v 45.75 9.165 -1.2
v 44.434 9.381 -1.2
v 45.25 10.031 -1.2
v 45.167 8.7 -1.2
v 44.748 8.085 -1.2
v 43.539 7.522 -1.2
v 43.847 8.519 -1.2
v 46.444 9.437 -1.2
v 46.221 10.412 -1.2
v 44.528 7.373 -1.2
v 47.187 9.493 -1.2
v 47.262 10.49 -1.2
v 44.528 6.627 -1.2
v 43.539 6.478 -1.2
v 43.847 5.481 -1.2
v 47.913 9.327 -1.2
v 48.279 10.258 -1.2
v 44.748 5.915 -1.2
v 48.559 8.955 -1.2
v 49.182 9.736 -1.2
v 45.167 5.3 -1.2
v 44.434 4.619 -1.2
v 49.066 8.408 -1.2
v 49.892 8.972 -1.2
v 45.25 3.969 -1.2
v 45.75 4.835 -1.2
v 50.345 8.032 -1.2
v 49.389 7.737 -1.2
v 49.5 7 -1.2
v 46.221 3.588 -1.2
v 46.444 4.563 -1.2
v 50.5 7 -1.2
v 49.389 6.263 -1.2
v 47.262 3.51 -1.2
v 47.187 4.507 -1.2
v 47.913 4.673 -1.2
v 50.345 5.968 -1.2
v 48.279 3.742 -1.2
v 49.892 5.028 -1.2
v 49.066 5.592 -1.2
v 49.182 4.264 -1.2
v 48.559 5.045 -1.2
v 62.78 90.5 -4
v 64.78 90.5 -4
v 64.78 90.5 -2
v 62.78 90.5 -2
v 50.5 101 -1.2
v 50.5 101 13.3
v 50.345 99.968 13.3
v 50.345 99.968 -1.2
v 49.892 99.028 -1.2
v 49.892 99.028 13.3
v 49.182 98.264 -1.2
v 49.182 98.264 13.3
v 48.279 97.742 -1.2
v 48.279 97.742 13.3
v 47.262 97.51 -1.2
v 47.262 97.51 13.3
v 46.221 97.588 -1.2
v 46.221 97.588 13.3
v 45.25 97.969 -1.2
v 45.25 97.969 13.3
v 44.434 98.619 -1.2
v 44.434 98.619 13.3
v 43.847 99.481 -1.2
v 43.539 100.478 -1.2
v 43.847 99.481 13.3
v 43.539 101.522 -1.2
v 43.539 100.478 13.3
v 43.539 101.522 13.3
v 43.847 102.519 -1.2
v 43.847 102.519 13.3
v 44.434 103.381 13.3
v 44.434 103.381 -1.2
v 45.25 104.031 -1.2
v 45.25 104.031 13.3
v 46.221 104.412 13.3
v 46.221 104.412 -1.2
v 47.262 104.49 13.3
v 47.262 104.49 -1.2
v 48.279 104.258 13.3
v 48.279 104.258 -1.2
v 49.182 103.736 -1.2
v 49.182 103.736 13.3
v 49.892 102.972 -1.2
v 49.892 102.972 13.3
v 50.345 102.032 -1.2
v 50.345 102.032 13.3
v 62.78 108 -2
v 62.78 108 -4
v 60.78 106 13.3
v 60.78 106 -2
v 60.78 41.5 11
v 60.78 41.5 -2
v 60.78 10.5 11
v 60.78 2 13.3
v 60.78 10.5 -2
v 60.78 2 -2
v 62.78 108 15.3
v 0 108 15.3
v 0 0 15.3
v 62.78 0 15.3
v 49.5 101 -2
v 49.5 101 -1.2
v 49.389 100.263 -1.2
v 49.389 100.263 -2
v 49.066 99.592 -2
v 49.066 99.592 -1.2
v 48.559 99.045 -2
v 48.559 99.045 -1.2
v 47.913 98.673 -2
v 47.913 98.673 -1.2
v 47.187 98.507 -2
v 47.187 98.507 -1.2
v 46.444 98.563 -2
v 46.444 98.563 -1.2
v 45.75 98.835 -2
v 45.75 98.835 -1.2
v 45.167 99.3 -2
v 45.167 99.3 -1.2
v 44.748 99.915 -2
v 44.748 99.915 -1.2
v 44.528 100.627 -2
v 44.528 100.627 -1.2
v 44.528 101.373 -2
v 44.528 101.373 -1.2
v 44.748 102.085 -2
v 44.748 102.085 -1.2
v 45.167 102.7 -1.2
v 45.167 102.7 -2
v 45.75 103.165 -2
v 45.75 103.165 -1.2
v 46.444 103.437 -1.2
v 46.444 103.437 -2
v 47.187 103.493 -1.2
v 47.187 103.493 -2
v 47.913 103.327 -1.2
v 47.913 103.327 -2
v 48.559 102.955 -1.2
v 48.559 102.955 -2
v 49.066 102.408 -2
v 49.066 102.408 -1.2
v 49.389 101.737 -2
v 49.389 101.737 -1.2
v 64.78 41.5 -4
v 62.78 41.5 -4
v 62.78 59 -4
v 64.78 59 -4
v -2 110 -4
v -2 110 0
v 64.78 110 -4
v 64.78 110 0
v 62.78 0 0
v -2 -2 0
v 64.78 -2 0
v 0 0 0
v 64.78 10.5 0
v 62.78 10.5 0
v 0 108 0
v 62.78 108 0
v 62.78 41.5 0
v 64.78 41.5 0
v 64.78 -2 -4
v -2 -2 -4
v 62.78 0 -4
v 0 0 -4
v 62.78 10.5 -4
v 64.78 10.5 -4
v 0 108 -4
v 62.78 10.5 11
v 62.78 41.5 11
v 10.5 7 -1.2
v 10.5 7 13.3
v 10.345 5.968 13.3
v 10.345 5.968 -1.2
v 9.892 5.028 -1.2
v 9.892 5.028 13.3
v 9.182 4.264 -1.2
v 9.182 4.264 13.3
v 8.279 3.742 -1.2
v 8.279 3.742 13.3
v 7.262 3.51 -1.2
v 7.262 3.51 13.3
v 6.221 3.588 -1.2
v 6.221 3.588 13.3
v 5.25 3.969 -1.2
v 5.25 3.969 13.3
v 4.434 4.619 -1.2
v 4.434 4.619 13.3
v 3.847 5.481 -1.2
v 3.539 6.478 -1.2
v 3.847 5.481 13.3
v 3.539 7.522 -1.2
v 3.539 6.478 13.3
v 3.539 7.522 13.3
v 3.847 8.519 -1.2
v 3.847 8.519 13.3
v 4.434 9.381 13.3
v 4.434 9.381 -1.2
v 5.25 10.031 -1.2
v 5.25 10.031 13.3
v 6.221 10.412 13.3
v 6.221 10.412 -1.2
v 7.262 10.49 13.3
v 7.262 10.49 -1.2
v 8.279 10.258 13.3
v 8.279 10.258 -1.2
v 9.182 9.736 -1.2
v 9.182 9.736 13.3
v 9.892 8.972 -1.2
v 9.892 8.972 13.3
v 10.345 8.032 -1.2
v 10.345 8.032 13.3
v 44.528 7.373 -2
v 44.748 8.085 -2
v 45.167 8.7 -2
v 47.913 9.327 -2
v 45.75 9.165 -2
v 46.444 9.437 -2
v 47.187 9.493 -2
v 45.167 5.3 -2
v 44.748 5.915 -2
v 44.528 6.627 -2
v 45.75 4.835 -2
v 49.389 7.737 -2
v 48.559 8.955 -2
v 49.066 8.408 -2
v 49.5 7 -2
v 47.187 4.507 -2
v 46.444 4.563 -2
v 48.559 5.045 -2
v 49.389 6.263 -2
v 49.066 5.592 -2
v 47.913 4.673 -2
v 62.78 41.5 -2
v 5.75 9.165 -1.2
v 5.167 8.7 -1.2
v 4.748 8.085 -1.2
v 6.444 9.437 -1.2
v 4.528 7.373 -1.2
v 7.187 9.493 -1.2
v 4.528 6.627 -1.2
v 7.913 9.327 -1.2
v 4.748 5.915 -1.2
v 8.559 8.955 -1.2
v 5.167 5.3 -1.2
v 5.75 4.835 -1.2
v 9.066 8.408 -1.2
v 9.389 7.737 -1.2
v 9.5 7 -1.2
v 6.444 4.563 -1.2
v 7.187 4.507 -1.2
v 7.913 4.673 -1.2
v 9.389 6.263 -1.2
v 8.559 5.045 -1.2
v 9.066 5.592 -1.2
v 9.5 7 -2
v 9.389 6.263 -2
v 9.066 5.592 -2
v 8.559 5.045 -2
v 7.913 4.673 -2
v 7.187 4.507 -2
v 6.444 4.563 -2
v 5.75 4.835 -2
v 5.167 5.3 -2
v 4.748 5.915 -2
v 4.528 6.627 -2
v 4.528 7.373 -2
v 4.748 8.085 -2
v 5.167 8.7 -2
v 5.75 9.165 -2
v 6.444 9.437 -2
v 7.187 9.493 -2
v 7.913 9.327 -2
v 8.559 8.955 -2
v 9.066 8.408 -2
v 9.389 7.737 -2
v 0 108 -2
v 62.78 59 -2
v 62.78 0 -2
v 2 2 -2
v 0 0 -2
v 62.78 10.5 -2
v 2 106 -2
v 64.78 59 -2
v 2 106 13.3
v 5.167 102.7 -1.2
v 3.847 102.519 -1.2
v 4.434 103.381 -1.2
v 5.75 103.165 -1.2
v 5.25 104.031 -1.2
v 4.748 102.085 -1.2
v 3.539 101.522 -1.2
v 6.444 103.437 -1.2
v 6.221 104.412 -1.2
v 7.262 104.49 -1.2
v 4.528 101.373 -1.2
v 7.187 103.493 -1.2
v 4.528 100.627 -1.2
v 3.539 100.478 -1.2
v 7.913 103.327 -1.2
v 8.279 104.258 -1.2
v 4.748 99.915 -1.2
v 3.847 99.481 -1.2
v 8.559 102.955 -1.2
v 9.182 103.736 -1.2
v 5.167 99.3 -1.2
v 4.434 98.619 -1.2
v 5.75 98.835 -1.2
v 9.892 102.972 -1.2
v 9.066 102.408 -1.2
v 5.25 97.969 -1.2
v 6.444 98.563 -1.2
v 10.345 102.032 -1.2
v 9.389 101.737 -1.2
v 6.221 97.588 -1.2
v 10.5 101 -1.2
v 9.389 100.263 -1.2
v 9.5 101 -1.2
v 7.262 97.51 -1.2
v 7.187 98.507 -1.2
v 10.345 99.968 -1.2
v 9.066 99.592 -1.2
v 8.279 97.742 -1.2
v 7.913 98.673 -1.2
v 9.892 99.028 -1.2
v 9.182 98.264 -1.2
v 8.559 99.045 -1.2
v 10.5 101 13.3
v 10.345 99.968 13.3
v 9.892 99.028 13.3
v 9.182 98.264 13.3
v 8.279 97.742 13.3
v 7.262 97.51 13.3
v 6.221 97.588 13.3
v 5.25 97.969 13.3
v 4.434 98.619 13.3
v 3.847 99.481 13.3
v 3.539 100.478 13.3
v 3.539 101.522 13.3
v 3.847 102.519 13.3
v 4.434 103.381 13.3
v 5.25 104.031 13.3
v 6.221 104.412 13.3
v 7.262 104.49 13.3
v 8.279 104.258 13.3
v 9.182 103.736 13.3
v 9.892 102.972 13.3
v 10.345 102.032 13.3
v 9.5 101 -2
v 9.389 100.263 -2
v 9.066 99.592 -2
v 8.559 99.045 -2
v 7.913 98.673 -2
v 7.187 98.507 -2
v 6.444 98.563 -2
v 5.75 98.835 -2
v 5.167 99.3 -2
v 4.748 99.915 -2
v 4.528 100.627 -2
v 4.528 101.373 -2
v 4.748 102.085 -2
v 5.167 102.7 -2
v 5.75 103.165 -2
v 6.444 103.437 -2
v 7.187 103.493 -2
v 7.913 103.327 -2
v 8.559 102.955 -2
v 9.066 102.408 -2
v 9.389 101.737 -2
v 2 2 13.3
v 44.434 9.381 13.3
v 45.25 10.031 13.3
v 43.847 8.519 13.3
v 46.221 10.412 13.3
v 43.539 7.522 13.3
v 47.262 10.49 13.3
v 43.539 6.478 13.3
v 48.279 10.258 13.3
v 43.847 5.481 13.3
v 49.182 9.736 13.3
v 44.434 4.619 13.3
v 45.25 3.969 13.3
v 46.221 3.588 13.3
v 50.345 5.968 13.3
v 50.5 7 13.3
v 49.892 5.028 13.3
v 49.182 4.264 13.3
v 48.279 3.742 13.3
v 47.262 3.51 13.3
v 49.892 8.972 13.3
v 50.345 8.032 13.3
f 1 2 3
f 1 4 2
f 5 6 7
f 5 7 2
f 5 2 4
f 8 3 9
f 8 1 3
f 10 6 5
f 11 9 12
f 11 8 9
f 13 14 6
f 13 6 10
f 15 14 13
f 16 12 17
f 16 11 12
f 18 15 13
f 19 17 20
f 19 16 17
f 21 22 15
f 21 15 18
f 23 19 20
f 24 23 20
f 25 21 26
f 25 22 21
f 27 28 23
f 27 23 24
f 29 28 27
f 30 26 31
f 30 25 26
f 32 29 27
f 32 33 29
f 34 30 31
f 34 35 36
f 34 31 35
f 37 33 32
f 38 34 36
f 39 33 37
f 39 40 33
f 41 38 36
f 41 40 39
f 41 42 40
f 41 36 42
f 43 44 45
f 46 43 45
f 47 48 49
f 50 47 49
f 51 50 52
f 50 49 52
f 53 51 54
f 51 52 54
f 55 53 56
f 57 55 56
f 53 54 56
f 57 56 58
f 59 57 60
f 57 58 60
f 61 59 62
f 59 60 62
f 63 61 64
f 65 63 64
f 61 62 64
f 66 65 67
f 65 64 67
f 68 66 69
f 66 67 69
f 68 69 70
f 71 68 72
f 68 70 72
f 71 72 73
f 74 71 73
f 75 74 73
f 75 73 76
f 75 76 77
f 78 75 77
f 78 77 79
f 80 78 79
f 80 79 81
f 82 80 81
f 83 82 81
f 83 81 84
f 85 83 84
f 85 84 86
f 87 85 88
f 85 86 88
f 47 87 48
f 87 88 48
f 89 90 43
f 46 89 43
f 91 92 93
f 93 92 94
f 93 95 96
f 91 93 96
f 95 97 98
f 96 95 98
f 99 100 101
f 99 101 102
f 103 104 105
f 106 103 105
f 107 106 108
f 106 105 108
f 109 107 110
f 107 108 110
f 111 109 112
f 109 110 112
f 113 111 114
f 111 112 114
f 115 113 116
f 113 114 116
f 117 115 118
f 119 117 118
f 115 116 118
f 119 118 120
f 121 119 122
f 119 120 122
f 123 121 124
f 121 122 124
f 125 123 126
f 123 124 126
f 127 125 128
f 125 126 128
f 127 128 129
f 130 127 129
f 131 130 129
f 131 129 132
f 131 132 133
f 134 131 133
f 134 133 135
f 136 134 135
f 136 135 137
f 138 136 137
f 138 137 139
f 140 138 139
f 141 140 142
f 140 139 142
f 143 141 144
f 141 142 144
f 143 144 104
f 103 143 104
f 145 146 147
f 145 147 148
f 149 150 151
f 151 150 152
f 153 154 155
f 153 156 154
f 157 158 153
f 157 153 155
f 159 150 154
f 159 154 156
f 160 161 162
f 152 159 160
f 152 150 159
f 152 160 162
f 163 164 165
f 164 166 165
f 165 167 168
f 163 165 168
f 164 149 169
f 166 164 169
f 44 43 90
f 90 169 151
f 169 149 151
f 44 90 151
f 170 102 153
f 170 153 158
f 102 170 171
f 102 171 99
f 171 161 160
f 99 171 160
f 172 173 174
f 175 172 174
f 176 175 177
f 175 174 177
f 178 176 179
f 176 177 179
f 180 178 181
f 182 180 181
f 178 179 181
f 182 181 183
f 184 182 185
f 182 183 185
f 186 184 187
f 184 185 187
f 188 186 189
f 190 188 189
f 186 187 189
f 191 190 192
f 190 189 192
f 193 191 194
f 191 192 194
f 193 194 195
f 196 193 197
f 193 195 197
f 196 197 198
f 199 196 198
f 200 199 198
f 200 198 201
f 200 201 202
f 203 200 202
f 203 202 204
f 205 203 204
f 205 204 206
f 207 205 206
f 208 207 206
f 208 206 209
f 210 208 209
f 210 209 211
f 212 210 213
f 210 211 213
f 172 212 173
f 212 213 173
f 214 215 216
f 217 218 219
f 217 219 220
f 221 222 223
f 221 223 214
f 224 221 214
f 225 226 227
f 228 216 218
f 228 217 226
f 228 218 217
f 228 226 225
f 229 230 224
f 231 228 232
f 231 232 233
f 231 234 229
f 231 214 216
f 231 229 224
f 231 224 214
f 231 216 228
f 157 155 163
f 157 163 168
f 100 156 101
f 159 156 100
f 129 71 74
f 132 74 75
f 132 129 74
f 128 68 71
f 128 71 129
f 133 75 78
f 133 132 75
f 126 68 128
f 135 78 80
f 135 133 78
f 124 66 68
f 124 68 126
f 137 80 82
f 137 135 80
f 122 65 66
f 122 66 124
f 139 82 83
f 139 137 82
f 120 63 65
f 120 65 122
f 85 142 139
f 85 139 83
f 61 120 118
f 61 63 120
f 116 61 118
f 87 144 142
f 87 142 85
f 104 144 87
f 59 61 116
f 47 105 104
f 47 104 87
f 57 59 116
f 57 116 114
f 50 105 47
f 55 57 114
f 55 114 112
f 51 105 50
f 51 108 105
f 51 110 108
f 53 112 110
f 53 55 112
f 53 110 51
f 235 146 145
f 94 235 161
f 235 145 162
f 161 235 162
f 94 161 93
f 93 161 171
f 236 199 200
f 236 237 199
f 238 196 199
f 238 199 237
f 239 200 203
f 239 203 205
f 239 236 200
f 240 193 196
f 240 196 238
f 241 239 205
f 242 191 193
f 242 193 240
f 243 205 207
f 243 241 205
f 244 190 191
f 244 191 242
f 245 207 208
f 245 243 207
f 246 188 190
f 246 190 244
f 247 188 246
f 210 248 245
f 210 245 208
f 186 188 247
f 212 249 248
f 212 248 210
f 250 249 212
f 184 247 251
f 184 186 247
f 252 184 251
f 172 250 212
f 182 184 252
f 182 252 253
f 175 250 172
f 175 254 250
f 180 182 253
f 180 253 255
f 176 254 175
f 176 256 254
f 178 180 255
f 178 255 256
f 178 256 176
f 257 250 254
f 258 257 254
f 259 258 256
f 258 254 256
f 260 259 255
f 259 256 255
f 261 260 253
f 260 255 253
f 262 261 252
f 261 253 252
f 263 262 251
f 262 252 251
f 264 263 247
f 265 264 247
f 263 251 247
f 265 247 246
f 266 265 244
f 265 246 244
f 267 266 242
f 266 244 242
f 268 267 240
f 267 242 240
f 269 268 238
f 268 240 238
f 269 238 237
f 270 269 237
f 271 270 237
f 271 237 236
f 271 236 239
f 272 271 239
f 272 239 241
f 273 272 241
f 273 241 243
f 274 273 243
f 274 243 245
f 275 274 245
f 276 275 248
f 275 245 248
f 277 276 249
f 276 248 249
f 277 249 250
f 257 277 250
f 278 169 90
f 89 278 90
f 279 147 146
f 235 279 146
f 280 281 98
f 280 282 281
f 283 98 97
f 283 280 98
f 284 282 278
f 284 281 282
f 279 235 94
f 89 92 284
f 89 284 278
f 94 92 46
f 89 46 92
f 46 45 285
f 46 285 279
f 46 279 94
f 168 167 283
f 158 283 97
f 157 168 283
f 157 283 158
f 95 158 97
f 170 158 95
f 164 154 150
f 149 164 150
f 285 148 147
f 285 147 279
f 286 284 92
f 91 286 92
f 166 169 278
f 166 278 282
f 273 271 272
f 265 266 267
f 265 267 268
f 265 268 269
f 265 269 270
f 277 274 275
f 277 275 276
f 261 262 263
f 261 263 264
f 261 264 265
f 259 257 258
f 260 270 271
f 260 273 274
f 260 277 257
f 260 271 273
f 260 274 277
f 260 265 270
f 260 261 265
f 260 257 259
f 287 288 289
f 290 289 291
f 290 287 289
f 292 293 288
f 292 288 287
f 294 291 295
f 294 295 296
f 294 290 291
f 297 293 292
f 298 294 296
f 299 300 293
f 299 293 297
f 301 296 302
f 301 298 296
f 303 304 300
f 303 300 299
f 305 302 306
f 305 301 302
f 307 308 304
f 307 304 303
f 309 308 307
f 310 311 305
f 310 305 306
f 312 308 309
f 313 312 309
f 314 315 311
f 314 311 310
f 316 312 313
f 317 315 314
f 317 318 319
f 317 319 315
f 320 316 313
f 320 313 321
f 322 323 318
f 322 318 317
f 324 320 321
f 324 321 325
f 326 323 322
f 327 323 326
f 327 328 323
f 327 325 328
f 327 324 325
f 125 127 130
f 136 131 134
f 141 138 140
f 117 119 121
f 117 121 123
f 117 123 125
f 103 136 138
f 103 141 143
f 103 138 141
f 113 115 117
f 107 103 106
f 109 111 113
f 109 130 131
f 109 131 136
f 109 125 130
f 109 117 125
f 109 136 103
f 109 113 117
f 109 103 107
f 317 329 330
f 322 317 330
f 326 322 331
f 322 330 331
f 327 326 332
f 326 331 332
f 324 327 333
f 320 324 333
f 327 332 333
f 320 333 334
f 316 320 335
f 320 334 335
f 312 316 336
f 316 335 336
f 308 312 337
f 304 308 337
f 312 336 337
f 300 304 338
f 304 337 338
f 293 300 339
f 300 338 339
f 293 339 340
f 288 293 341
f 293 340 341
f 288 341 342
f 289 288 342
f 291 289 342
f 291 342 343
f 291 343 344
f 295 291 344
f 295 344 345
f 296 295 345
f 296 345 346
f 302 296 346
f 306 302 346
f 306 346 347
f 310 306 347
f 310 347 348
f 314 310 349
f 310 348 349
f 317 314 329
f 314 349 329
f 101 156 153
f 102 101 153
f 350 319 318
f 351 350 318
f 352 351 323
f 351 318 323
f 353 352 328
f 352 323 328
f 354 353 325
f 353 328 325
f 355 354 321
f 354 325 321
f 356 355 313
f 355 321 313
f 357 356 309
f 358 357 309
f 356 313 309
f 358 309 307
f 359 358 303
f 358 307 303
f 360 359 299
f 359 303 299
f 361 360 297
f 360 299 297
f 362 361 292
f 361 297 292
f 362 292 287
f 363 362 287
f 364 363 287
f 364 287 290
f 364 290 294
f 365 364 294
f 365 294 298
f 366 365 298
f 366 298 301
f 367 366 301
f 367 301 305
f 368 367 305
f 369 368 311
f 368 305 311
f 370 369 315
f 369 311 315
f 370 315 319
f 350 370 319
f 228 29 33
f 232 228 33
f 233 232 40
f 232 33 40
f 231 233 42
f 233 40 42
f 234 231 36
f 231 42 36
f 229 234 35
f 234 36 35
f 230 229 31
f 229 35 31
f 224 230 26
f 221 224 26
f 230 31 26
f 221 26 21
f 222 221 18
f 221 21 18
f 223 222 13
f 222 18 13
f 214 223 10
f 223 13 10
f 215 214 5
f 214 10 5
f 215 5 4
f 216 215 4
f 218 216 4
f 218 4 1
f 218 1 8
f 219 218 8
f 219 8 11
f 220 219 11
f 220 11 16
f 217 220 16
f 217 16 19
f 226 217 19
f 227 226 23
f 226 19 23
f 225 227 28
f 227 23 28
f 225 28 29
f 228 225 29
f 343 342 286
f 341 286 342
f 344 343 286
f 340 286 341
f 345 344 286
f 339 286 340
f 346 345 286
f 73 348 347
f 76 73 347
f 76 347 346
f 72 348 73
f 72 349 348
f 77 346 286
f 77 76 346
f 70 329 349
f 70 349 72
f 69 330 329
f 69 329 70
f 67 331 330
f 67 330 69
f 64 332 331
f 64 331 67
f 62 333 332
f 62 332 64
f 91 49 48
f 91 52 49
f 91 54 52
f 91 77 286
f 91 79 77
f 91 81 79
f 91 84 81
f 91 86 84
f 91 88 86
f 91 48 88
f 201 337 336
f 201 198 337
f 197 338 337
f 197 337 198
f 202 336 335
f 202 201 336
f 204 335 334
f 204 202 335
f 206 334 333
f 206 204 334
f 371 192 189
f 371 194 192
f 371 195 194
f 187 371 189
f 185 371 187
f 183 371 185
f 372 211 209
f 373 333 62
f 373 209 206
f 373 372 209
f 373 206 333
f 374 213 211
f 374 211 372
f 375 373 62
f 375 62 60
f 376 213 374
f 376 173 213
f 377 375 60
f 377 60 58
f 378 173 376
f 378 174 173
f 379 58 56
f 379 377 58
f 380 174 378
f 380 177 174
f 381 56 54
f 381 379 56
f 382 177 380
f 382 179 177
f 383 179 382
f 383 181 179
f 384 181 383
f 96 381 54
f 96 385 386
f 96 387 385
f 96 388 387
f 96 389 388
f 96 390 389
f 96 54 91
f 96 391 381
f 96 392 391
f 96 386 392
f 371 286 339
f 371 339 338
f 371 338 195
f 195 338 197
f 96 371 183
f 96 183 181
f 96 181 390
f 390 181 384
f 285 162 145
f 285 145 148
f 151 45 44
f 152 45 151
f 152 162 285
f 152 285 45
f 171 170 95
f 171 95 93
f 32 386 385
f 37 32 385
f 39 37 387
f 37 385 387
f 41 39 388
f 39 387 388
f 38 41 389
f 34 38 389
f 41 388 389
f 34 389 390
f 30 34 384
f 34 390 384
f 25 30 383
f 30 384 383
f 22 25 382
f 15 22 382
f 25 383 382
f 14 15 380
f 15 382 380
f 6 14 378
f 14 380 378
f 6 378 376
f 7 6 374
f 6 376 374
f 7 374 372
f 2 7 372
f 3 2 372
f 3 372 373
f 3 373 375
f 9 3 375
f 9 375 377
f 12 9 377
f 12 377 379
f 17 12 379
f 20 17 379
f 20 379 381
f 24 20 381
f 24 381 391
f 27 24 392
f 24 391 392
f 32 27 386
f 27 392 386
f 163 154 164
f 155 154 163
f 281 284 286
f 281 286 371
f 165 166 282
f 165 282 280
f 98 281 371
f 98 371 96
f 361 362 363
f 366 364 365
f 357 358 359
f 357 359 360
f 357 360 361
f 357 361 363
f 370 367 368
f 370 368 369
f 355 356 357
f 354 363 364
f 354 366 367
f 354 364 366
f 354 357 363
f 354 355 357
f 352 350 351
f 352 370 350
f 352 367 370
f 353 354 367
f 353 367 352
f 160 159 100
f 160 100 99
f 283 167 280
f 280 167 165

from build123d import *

# Parameters (mm, degrees)
SKETCH004_W     = 66.78
SKETCH004_H     = 112
PAD002_DEPTH    = 4
SKETCH005_W     = 62.78
SKETCH005_H     = 108
PAD003_DEPTH    = 15.3
SKETCH006_W     = 62.78
SKETCH006_H     = 108
POCKET002_DEPTH = 2
SKETCH007_W     = 58.78
SKETCH007_H     = 104
POCKET003_DEPTH = 15.3
SKETCH008_R     = 3.5
PAD004_DEPTH    = 14.5
SKETCH009_R     = 2.5
PAD005_DEPTH    = 0.8
SKETCH010_W     = 31.5
SKETCH010_H     = 5.15
POCKET004_DEPTH = 5
SKETCH011_W     = 31
SKETCH011_H     = 15
POCKET005_DEPTH = 5


with BuildPart() as part:
    # Sketch004 → Pad002 (new body)
    with BuildSketch(Plane.XY):
        with Locations((31.39, 54)):
            Rectangle(SKETCH004_W, SKETCH004_H)
    extrude(amount=-PAD002_DEPTH)

    # Sketch005 (on Face5 of Pad002) → Pad003 (join)
    with BuildSketch(Plane.XY):
        with Locations((31.39, 54)):
            Rectangle(SKETCH005_W, SKETCH005_H)
    extrude(amount=PAD003_DEPTH)

    # Sketch006 (on Face5 of Pad003) → Pocket002 (cut)
    with BuildSketch(Plane(origin=(0, 0, -4), x_dir=(1, 0, 0), z_dir=(0, 0, -1))):
        with Locations((31.39, -54)):
            Rectangle(SKETCH006_W, SKETCH006_H)
    extrude(amount=-POCKET002_DEPTH, mode=Mode.SUBTRACT)

    # Sketch007 (on Face16 of Pocket002) → Pocket003 (cut)
    with BuildSketch(Plane(origin=(0, 0, -2), x_dir=(1, 0, 0), z_dir=(0, 0, -1))):
        with Locations((31.39, -54)):
            Rectangle(SKETCH007_W, SKETCH007_H)
    extrude(amount=-POCKET003_DEPTH, mode=Mode.SUBTRACT)

    # Sketch008 (on Face21 of Pocket003) → Pad004 (join)
    with BuildSketch(Plane(origin=(0, 0, 13.3), x_dir=(1, 0, 0), z_dir=(0, 0, -1))):
        with Locations((7, -7)):
            Circle(SKETCH008_R)
        with Locations((47, -7)):
            Circle(SKETCH008_R)
        with Locations((7, -101)):
            Circle(SKETCH008_R)
        with Locations((47, -101)):
            Circle(SKETCH008_R)
    extrude(amount=PAD004_DEPTH)

    # Sketch009 (on Face28 of Pad004) → Pad005 (join)
    with BuildSketch(Plane(origin=(0, 0, -1.2), x_dir=(1, 0, 0), z_dir=(0, 0, -1))):
        with Locations((7, -7)):
            Circle(SKETCH009_R)
        with Locations((47, -7)):
            Circle(SKETCH009_R)
        with Locations((7, -101)):
            Circle(SKETCH009_R)
        with Locations((47, -101)):
            Circle(SKETCH009_R)
    extrude(amount=PAD005_DEPTH)

    # Sketch010 (on Face3 of Pad005) → Pocket004 (cut)
    with BuildSketch(Plane.YZ.offset(64.78)):
        with Locations((74.75, -4.575)):
            Rectangle(SKETCH010_W, SKETCH010_H)
    extrude(amount=-POCKET004_DEPTH, mode=Mode.SUBTRACT)

    # Sketch011 (on Face3 of Pocket004) → Pocket005 (cut)
    with BuildSketch(Plane.YZ.offset(64.78)):
        with Locations((26, 3.5)):
            Rectangle(SKETCH011_W, SKETCH011_H)
    extrude(amount=-POCKET005_DEPTH, mode=Mode.SUBTRACT)


solid = part.part
